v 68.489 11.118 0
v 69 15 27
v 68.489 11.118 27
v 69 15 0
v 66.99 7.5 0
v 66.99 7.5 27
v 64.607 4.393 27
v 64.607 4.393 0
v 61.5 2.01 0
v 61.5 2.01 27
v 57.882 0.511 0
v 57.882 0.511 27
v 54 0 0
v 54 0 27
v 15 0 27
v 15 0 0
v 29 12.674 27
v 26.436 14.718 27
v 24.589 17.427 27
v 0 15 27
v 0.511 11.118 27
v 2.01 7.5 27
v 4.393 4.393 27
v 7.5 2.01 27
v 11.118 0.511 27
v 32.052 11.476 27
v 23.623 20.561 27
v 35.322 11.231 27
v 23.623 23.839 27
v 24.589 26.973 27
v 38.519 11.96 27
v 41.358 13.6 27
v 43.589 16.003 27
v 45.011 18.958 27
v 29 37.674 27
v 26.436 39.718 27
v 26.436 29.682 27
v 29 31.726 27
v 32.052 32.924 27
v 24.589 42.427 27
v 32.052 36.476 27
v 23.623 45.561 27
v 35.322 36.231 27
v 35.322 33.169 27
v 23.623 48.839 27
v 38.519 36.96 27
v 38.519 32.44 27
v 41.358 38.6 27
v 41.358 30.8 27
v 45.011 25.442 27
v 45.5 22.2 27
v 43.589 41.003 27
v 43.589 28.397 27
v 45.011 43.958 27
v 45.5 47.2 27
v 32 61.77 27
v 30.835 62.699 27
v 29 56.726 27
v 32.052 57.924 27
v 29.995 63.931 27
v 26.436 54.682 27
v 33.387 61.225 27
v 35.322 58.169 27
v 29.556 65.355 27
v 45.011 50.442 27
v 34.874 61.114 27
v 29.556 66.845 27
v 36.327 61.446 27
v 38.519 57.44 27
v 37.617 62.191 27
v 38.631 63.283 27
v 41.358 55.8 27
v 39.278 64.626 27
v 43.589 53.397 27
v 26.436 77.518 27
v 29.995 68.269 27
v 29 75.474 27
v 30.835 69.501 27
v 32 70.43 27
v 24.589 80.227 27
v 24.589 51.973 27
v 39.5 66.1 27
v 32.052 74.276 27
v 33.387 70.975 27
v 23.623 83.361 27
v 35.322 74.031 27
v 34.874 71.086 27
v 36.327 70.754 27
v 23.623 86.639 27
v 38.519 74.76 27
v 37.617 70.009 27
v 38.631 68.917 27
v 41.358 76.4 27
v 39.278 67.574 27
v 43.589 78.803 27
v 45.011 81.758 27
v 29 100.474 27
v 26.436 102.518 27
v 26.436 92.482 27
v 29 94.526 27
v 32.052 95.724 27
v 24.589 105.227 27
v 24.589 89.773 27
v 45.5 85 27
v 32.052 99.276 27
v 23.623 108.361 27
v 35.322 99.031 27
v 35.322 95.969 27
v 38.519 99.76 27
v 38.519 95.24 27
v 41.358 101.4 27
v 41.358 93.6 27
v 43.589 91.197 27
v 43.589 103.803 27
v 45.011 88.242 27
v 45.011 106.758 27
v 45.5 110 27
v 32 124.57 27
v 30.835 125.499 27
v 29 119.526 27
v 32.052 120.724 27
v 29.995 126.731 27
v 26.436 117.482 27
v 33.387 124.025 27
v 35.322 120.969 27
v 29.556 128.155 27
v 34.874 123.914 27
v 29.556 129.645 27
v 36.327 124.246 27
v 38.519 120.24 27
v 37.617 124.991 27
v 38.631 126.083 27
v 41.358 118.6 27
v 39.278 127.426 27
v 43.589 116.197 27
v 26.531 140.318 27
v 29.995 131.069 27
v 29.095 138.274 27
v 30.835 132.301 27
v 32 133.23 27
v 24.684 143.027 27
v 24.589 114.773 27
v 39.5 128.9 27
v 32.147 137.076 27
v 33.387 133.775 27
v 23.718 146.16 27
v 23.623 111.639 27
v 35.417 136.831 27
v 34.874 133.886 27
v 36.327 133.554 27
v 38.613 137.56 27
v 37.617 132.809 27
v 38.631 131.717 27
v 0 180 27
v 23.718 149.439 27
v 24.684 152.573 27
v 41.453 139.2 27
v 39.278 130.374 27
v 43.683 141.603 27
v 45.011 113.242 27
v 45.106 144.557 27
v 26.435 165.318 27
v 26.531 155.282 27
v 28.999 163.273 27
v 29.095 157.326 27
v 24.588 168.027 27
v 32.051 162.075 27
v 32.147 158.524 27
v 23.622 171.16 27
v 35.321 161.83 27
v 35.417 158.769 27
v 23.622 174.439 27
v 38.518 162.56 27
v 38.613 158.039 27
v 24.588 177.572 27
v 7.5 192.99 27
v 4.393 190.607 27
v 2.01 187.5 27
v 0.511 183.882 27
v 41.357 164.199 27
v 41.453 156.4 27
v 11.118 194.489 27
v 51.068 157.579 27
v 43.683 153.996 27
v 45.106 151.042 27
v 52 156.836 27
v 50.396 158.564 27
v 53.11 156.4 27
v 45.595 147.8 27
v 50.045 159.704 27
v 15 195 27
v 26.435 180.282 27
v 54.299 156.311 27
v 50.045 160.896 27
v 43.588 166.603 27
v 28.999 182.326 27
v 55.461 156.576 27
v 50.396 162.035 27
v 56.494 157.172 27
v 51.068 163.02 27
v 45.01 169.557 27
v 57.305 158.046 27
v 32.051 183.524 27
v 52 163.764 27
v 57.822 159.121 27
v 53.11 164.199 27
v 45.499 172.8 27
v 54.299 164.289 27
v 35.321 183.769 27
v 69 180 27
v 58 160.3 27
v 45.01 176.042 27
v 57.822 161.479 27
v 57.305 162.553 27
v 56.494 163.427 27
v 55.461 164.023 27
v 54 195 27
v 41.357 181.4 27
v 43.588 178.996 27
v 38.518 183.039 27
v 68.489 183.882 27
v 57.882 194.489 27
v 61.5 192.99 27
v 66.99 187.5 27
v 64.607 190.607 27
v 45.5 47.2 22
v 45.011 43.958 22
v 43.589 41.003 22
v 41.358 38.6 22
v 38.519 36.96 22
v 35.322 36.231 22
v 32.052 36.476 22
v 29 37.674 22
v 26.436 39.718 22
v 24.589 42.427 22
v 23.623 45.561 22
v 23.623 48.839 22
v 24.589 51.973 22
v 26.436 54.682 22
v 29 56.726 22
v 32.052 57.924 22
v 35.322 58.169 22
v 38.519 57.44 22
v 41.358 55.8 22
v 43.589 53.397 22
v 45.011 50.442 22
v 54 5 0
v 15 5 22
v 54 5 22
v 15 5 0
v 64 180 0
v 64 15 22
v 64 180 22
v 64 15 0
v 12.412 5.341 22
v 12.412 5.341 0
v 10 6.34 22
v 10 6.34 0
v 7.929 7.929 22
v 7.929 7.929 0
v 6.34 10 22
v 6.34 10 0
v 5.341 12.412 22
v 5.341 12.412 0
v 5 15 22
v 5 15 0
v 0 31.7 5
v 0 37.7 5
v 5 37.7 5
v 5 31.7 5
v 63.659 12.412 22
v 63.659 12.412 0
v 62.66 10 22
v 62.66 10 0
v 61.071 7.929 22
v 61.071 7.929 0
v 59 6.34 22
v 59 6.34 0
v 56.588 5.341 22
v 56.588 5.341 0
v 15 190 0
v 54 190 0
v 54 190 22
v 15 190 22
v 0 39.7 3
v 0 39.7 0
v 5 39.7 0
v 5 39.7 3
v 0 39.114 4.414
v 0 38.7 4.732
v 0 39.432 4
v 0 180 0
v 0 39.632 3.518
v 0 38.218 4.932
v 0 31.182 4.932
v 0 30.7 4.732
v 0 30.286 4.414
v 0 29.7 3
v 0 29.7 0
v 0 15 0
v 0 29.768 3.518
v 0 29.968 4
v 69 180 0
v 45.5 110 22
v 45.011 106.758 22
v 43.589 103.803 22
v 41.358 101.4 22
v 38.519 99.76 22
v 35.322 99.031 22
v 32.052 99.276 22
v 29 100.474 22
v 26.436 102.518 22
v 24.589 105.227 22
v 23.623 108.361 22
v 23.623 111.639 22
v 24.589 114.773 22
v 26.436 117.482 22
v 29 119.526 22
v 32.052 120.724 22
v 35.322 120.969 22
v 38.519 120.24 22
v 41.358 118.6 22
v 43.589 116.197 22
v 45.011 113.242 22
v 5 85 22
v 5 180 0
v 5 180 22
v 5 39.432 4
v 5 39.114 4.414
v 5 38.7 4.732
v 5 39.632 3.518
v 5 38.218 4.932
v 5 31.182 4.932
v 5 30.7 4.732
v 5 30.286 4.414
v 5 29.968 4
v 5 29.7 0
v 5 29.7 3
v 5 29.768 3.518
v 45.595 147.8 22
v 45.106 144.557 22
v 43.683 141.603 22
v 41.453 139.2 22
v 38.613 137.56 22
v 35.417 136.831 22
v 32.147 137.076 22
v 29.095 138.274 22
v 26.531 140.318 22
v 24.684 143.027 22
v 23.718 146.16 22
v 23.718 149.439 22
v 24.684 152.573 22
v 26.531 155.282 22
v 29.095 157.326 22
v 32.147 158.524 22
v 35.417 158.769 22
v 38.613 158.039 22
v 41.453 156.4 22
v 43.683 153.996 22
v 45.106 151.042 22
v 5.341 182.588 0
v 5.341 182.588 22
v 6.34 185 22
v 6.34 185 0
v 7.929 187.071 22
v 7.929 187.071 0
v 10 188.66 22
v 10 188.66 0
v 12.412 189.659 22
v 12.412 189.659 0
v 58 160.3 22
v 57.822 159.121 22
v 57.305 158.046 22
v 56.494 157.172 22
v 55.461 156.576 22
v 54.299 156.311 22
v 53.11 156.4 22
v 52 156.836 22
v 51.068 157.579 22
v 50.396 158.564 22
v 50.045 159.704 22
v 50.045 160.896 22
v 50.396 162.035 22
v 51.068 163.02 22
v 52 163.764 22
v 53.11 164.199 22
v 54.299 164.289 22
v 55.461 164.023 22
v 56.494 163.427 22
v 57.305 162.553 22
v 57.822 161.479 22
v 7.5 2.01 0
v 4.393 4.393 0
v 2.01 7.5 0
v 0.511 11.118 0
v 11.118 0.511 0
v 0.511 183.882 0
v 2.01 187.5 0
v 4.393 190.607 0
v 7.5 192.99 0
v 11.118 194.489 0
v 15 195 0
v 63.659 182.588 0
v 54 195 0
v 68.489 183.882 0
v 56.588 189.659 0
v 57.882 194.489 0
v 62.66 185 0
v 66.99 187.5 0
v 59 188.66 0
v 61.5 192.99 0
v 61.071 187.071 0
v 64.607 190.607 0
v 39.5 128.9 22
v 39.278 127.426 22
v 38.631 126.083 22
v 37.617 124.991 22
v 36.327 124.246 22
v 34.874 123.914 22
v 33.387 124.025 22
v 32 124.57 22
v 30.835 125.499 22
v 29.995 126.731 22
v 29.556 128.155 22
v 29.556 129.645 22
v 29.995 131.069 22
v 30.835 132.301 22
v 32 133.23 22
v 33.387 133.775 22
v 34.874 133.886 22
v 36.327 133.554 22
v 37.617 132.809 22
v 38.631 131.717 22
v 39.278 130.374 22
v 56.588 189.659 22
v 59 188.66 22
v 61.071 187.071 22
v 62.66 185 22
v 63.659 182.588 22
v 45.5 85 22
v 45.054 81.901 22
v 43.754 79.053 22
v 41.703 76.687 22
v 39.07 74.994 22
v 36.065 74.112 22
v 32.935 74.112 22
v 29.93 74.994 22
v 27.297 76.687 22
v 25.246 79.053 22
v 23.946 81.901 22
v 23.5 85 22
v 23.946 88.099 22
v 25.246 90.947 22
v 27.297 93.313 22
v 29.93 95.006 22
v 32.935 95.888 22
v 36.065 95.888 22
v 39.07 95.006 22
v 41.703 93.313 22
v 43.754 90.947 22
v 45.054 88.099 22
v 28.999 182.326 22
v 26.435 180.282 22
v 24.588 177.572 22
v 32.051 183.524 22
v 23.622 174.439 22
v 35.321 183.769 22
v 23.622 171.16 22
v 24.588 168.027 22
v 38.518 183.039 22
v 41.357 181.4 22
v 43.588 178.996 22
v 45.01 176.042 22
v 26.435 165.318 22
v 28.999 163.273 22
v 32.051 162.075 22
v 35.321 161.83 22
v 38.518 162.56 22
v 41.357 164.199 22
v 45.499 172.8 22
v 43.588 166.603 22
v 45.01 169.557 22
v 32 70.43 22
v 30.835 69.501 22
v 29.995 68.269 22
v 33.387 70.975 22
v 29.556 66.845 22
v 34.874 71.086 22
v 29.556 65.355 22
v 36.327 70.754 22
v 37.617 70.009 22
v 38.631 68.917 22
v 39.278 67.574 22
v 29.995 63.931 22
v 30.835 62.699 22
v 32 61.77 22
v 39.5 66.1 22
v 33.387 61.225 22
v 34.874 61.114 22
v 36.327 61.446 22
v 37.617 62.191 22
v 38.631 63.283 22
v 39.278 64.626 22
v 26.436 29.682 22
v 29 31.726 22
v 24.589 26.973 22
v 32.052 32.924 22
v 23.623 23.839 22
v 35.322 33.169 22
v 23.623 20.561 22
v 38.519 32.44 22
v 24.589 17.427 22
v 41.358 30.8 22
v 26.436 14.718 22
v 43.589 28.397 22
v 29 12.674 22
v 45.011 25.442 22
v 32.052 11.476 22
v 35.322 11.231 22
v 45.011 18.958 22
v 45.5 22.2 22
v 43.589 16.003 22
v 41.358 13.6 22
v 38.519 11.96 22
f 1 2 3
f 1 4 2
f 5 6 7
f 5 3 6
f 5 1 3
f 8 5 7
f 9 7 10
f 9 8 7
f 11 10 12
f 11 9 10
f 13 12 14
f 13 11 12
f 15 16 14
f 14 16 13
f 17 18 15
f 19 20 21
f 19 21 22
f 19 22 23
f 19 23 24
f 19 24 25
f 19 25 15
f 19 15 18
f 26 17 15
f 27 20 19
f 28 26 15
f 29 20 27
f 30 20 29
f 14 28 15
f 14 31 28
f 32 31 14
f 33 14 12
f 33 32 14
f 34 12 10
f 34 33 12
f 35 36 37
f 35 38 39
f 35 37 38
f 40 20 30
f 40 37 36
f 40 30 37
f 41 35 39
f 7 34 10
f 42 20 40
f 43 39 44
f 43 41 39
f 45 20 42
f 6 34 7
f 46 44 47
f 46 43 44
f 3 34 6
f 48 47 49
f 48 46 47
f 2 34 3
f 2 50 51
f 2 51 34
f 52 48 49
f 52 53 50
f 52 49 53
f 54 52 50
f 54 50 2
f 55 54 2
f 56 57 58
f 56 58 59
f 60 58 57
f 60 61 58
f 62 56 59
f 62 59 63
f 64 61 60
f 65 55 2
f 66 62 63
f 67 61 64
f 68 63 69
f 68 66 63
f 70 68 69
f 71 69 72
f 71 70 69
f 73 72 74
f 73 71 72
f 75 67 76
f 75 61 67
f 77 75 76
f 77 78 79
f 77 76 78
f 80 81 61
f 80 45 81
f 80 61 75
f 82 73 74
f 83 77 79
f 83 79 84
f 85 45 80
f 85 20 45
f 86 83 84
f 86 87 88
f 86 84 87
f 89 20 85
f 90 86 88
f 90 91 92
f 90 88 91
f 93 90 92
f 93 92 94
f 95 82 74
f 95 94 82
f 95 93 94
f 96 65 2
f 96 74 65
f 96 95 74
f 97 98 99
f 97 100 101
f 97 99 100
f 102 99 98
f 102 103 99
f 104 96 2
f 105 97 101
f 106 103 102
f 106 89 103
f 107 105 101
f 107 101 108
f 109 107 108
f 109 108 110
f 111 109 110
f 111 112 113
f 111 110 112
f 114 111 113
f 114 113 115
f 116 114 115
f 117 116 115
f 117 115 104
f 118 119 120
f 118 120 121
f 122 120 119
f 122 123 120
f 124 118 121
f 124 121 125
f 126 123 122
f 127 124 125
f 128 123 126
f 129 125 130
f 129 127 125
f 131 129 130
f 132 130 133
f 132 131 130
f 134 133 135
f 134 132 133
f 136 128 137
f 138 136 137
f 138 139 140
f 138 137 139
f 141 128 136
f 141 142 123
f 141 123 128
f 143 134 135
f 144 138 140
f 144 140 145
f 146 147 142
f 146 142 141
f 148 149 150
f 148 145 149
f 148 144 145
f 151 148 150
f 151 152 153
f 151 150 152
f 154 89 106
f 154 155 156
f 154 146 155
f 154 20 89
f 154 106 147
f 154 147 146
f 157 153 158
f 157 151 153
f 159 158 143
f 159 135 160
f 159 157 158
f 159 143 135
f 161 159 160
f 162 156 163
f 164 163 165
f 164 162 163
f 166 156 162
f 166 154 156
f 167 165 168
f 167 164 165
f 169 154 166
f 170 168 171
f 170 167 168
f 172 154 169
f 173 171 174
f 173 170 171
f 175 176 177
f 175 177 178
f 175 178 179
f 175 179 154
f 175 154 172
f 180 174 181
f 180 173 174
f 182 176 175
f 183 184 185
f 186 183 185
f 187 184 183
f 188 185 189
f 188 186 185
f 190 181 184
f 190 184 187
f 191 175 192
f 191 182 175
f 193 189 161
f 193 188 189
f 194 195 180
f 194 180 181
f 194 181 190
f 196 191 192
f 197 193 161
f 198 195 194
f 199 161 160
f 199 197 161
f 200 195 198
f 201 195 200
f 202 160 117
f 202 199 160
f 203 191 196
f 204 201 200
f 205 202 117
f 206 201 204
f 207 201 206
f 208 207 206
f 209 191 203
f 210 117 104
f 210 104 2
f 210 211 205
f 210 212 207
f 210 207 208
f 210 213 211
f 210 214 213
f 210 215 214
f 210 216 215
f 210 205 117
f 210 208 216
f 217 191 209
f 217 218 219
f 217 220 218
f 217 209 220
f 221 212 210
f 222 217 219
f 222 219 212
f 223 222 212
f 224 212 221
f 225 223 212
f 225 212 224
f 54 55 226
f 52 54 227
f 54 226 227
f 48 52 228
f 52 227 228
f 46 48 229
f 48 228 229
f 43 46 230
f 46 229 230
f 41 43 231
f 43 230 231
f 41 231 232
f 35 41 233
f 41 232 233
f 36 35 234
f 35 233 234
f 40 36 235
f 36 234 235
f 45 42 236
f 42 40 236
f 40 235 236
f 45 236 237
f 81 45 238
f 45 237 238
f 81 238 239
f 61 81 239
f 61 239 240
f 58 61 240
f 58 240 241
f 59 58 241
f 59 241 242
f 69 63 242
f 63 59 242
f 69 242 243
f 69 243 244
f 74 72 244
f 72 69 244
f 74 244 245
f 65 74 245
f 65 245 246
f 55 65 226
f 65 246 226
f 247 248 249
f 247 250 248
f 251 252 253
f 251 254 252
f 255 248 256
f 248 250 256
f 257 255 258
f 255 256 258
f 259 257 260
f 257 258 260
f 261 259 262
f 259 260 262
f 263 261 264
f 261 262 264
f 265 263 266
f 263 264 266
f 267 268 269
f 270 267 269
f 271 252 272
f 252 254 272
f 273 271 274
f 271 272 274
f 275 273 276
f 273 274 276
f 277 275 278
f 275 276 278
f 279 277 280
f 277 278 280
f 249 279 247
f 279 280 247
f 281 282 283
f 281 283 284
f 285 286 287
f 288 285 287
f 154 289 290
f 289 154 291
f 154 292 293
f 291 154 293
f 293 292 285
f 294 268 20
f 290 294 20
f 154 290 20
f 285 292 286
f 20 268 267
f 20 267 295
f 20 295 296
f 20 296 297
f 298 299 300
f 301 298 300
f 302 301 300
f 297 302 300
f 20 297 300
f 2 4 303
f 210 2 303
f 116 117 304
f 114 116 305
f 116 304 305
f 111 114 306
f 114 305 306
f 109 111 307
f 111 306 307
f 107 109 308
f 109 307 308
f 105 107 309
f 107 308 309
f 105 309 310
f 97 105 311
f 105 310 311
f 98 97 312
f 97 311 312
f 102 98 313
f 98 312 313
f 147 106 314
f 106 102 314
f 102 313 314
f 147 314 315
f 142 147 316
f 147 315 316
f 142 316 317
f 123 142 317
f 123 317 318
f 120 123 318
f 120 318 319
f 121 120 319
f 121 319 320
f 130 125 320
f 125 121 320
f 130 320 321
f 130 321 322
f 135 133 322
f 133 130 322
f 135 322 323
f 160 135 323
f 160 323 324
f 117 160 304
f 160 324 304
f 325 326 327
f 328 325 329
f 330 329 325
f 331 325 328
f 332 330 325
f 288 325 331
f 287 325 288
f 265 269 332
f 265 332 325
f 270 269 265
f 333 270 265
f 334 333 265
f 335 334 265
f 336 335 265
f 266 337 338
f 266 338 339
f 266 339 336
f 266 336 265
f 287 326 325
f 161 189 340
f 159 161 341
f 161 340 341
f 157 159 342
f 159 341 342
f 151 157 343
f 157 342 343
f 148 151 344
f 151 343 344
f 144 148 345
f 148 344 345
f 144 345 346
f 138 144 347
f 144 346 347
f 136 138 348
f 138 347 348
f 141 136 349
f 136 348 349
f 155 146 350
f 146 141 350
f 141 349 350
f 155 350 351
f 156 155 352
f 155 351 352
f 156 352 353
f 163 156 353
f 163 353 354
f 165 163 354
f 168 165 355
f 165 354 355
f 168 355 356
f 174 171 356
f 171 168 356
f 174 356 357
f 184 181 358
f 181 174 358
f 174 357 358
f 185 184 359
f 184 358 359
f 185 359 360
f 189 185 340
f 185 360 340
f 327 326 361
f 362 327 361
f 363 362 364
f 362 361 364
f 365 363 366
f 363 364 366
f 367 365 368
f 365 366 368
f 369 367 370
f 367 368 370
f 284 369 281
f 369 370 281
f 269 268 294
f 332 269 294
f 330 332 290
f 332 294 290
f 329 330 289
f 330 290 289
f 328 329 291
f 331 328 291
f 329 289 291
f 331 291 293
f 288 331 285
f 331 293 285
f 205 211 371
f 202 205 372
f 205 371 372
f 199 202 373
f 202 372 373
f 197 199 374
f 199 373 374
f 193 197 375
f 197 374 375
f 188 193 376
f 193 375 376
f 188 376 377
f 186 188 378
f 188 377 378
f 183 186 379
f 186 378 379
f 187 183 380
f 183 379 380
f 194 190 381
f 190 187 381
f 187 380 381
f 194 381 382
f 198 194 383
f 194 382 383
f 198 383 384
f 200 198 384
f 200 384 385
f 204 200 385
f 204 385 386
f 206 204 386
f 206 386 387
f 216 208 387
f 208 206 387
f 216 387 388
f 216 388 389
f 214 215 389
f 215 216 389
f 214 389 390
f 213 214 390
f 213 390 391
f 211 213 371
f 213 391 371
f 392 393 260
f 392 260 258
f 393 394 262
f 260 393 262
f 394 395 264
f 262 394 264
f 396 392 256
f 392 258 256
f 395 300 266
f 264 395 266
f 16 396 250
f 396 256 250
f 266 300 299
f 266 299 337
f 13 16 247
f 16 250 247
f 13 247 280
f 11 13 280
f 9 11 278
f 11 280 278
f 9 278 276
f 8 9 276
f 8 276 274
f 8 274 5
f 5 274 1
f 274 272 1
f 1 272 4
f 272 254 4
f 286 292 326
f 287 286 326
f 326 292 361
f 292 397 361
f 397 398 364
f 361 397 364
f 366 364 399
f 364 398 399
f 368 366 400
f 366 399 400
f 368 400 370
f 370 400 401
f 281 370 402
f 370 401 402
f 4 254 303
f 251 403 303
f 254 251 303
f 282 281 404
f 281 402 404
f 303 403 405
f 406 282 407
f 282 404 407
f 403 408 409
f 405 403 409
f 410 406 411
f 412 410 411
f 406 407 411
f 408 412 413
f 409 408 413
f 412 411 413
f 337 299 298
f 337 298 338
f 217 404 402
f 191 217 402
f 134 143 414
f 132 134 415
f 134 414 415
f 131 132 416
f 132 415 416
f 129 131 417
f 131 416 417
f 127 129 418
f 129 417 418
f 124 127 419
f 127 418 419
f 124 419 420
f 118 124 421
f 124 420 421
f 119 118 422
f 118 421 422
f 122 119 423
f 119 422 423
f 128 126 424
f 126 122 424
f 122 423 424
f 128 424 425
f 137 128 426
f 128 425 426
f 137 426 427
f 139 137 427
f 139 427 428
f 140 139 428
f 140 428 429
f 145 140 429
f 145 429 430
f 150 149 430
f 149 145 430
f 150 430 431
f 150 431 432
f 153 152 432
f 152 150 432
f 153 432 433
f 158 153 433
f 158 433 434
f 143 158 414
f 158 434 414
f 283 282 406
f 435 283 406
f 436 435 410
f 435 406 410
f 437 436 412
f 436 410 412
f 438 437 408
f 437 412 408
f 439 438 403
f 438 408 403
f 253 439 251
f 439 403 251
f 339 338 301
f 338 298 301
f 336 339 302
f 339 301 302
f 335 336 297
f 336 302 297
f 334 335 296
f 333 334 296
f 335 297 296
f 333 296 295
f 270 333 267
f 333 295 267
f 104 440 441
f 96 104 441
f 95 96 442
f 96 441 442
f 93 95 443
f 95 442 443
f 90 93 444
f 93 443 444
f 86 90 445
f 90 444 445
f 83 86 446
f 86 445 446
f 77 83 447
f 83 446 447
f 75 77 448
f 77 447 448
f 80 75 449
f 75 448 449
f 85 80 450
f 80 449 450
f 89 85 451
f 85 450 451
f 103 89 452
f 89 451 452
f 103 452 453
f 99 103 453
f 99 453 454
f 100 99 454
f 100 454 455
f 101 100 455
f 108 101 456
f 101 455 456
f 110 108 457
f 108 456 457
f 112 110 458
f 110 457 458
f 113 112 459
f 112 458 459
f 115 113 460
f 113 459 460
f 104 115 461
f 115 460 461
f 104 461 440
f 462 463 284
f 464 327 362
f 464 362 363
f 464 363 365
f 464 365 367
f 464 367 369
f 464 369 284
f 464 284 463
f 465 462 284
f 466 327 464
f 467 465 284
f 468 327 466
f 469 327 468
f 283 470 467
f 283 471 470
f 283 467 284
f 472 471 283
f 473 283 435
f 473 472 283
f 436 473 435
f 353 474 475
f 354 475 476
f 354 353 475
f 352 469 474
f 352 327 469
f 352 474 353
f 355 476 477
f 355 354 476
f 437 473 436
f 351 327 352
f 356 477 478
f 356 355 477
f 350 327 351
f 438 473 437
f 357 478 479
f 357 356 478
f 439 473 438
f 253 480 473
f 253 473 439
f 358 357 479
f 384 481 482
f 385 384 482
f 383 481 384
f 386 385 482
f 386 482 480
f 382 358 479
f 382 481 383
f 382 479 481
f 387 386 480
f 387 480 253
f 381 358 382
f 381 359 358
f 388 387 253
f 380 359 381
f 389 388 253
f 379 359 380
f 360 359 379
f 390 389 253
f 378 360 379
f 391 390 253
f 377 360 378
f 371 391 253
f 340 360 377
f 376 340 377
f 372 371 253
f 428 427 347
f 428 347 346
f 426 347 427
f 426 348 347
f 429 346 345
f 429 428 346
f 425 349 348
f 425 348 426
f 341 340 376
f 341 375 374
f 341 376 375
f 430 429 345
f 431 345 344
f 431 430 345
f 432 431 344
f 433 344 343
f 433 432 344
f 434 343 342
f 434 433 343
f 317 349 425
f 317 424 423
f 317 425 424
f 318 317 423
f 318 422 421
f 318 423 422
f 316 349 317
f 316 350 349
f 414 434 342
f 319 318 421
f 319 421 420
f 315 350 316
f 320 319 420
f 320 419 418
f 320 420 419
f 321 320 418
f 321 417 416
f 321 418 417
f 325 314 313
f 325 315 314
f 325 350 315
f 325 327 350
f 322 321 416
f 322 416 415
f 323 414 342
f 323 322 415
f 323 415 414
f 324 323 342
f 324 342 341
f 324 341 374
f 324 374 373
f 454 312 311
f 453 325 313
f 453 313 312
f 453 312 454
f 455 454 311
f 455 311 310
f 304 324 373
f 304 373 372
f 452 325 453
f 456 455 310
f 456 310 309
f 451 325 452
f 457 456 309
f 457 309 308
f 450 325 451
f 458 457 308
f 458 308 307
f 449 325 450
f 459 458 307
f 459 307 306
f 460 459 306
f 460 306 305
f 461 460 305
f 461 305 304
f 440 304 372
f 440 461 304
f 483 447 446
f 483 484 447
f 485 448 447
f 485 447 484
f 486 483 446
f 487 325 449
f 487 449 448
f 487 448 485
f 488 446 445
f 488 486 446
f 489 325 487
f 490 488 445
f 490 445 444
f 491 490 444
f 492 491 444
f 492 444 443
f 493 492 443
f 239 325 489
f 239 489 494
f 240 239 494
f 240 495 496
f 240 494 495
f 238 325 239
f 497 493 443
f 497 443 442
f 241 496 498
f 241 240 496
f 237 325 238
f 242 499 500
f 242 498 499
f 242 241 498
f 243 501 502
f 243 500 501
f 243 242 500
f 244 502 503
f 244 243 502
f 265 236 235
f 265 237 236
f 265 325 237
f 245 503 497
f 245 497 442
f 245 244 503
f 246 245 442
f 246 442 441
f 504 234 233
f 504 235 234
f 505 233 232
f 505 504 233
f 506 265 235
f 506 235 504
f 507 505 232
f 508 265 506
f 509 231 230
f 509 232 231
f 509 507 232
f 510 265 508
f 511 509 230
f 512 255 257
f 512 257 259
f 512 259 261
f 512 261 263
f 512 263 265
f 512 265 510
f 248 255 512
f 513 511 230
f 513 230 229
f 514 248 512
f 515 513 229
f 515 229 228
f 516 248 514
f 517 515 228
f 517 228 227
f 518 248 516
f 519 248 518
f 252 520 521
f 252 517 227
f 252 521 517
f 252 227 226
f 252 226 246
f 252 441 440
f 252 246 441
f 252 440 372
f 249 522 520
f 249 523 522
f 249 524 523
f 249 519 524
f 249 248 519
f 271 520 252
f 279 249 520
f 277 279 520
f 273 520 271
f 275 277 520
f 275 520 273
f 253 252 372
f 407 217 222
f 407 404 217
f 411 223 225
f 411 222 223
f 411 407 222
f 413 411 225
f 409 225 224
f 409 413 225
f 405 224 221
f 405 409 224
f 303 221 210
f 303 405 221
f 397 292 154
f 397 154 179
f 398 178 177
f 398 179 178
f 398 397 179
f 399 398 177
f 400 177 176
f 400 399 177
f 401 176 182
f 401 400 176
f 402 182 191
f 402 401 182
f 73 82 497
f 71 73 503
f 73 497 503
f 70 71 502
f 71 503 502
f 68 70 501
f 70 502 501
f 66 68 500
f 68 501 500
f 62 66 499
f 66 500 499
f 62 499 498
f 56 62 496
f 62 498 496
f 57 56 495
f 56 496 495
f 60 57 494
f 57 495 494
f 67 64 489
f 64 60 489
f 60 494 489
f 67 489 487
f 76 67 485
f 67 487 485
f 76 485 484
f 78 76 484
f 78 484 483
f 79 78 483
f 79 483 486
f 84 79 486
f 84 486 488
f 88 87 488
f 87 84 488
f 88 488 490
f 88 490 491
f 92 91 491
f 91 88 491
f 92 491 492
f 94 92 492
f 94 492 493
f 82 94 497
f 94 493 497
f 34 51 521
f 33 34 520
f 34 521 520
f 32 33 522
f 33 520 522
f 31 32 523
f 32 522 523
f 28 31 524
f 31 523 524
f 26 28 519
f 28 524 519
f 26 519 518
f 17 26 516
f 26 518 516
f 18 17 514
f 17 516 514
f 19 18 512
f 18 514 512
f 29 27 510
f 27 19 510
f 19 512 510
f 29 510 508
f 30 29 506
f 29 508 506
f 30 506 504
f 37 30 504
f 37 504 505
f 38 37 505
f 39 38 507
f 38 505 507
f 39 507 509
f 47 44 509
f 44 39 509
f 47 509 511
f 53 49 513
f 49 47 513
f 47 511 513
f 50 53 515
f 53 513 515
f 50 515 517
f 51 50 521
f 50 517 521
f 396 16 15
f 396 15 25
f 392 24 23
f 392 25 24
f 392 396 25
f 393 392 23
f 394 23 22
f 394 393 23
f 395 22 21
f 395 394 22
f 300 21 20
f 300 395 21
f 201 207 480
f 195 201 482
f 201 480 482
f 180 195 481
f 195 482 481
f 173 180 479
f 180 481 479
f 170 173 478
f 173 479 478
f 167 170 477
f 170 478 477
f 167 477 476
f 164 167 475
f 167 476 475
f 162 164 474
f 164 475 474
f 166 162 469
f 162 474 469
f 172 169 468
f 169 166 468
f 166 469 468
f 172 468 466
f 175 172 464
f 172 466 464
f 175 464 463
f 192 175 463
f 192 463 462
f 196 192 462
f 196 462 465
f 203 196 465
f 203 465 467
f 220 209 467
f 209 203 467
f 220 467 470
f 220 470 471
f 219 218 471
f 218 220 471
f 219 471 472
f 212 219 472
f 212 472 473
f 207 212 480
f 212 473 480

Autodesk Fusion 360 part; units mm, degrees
sketch "Sketch1" plane through (0, 0, 0) normal (0, 0, 1) x (1, 0, 0)
  line L0 (10, 0) -> (59, 0)
  line L1 (69, 10) -> (69, 170)
  line L2 (59, 180) -> (10, 180)
  line L3 (0, 170) -> (0, 10)
  arc A0 (10, 180) -> (0, 170) centre (10, 170) ccw
  arc A1 (69, 170) -> (59, 180) centre (59, 170) ccw
  arc A2 (59, 0) -> (69, 10) centre (59, 10) ccw
  arc A3 (0, 10) -> (10, 0) centre (10, 10) ccw
  point P0 (69, 0)
  point P1 (0, 180)
  dimension "d1" = 69
  dimension "d2" = 180
  dimension "d3" = 10
  dimension "d4" = 10
  dimension "d5" = 10
sketch "Sketch2" plane through (0, 0, 27) normal (0, 0, 1) x (-1, 0, 0)
  line L0 (-10, 0) -> (-59, 0)
  arc A0 (-59, 0) -> (-69, -10) centre (-59, -10) ccw
sketch "Sketch3" plane through (0, 0, 0) normal (0, 0, 1) x (1, 0, 0)
  line L0 (15, 0) -> (54, 0)
  line L1 (69, 15) -> (69, 180)
  line L2 (54, 195) -> (15, 195)
  line L3 (0, 180) -> (0, 15)
  circle A0 centre (34.5, 110) radius 11
  circle A1 centre (34.5, 85) radius 11
  circle A2 centre (34.5, 128.9) radius 5
  circle A3 centre (34.5, 66.1) radius 5
  circle A4 centre (34.5, 47.2) radius 11
  circle A5 centre (34.5947, 147.7998) radius 11
  circle A6 centre (34.5, 22.2) radius 11
  circle A7 centre (34.4989, 172.7996) radius 11
  arc A8 (15, 195) -> (0, 180) centre (15, 180) ccw
  arc A9 (69, 180) -> (54, 195) centre (54, 180) ccw
  arc A10 (54, 0) -> (69, 15) centre (54, 15) ccw
  arc A11 (0, 15) -> (15, 0) centre (15, 15) ccw
  circle A12 centre (54, 160.2997) radius 4
  point P0 (69, 0)
  dimension "d76" = 22
  dimension "d77" = 22
  dimension "d78" = 18.9
  dimension "d79" = 18.9
  dimension "d80" = 10
  dimension "d81" = 10
  dimension "d82" = 18.9
  dimension "d83" = 18.9
  dimension "d84" = 22
  dimension "d85" = 22
  dimension "d86" = 25
  dimension "d87" = 25
  dimension "d88" = 22
  dimension "d89" = 22
  dimension "d90" = 15
  dimension "d91" = 15
  dimension "d92" = 15
  dimension "d93" = 15
  dimension "d130" = 8
sketch "Sketch4" plane through (0, 0, 27) normal (0, 0, 1) x (-1, 0, 0)
sketch "Sketch5" plane through (0, 0, 0) normal (0, 0, 1) x (1, 0, 0)
extrude "Extrude2" add sketch "Sketch3" along normal blind 27
sketch "Sketch6" plane through (0, 0, 0) normal (0, 0, -1) x (1, 0, 0)
  circle A0 centre (54, -160.2997) radius 4
  circle A1 centre (34.4989, -172.7996) radius 11
  circle A2 centre (34.5, -110) radius 11
  circle A3 centre (34.5947, -147.7998) radius 11
  circle A4 centre (34.5, -85) radius 11
  circle A5 centre (34.5, -66.1) radius 5
  circle A6 centre (34.5, -47.2) radius 11
  circle A7 centre (34.5, -22.2) radius 11
  circle A8 centre (34.5, -128.9) radius 5
  arc A9 (15, 0) -> (0, -15) centre (15, -15) ccw
  line L0 (0, -15) -> (0, -180)
  arc A10 (0, -180) -> (15, -195) centre (15, -180) ccw
  line L1 (15, -195) -> (54, -195)
  arc A11 (54, -195) -> (69, -180) centre (54, -180) ccw
  line L2 (69, -180) -> (69, -15)
  arc A12 (69, -15) -> (54, 0) centre (54, -15) ccw
  line L3 (54, 0) -> (15, 0)
  line L4 (34.5, -85) -> (0, -85)
  line L5 (15, -5) -> (54, -5)
  line L6 (64, -15) -> (64, -180)
  line L7 (54, -190) -> (15, -190)
  line L8 (5, -180) -> (5, -15)
  arc A13 (15, -5) -> (5, -15) centre (15, -15) ccw
  arc A14 (64, -15) -> (54, -5) centre (54, -15) ccw
  arc A15 (5, -180) -> (15, -190) centre (15, -180) ccw
  arc A16 (54, -190) -> (64, -180) centre (54, -180) ccw
  dimension "d162" = 10
  dimension "d163" = 10
  dimension "d164" = 10
  dimension "d165" = 10
extrude "Extrude3" cut sketch "Sketch6" against normal blind 22 contours L5 L6 L7 L8 A13 A14 A15 A16
sketch "Sketch7" plane through (0, 0, 27) normal (0, 0, 1) x (-1, 0, 0)
  circle A0 centre (-54, -160.2997) radius 4
  circle A1 centre (-34.4989, -172.7996) radius 11
  circle A2 centre (-34.5, -110) radius 11
  circle A3 centre (-34.5947, -147.7998) radius 11
  circle A4 centre (-34.5, -85) radius 11
  circle A5 centre (-34.5, -66.1) radius 5
  circle A6 centre (-34.5, -47.2) radius 11
  circle A7 centre (-34.5, -22.2) radius 11
  circle A8 centre (-34.5, -128.9) radius 5
  arc A9 (0, -15) -> (-15, 0) centre (-15, -15) ccw
  line L0 (-15, 0) -> (-54, 0)
  arc A10 (-54, 0) -> (-69, -15) centre (-54, -15) ccw
  line L1 (-69, -15) -> (-69, -180)
  arc A11 (-69, -180) -> (-54, -195) centre (-54, -180) ccw
  line L2 (-54, -195) -> (-15, -195)
  arc A12 (-15, -195) -> (0, -180) centre (-15, -180) ccw
  line L3 (0, -180) -> (0, -15)
sketch "Sketch8" plane through (0, 0, 0) normal (0, 0, -1) x (1, 0, 0)
  line L0 (54, -190) -> (15, -190)
  arc A0 (5, -180) -> (15, -190) centre (15, -180) ccw
  line L1 (5, -180) -> (5, -15)
  arc A1 (15, -5) -> (5, -15) centre (15, -15) ccw
  line L2 (15, -5) -> (54, -5)
  arc A2 (64, -15) -> (54, -5) centre (54, -15) ccw
  line L3 (64, -15) -> (64, -180)
  arc A3 (54, -190) -> (64, -180) centre (54, -180) ccw
  arc A4 (15, 0) -> (0, -15) centre (15, -15) ccw
  line L4 (0, -15) -> (0, -180)
  arc A5 (0, -180) -> (15, -195) centre (15, -180) ccw
  line L5 (15, -195) -> (54, -195)
  arc A6 (54, -195) -> (69, -180) centre (54, -180) ccw
  line L6 (69, -180) -> (69, -15)
  arc A7 (69, -15) -> (54, 0) centre (54, -15) ccw
  line L7 (54, 0) -> (15, 0)
  line L8 (0, -34.7) -> (0, -29.7)
  line L9 (0, -34.7) -> (0, -39.7)
  line L10 (0, -39.7) -> (0, -29.7)
  line L11 (0, -29.7) -> (5, -29.7)
  line L12 (0, -39.7) -> (5, -39.7)
  line L13 (5, -29.7) -> (5, -39.7)
extrude "Extrude4" cut sketch "Sketch8" against normal blind 5 contours L1 L4 L8 L9 L10 L11 L12 L13
sketch "Sketch9" plane through (0, 0, 0) normal (-1, 0, 0) x (0, -1, 0)
  line L0 (-39.7, 0) -> (-39.7, 5)
  line L1 (-39.7, 5) -> (-29.7, 5)
  line L2 (-29.7, 5) -> (-29.7, 0)
  line L3 (-29.7, 0) -> (-15, 0)
  line L4 (-15, 0) -> (-15, 27)
  line L5 (-15, 27) -> (-180, 27)
  line L6 (-180, 27) -> (-180, 0)
  line L7 (-180, 0) -> (-39.7, 0)
  line L8 (-29.7, 0) -> (-29.7, 3)
  line L9 (-31.7, 5) -> (-37.7, 5)
  line L10 (-39.7, 3) -> (-39.7, 0)
  arc A0 (-29.7, 3) -> (-31.7, 5) centre (-31.7, 3) ccw
  arc A1 (-37.7, 5) -> (-39.7, 3) centre (-37.7, 3) ccw
  dimension "d176" = 2
  dimension "d177" = 2
extrude "Extrude5" add sketch "Sketch9" against normal blind 5 contours L0 L1 A1 | L1 L2 A0
sketch "Sketch10" plane through (0, 0, 0) normal (-1, 0, 0) x (0, -1, 0)
  line L0 (-39.7, 0) -> (-39.7, 3)
  arc A0 (-37.7, 5) -> (-39.7, 3) centre (-37.7, 3) ccw
  line L1 (-37.7, 5) -> (-31.7, 5)
  arc A1 (-29.7, 3) -> (-31.7, 5) centre (-31.7, 3) ccw
  line L2 (-29.7, 3) -> (-29.7, 0)
  line L3 (-29.7, 0) -> (-15, 0)
  line L4 (-15, 0) -> (-15, 27)
  line L5 (-15, 27) -> (-180, 27)
  line L6 (-180, 27) -> (-180, 0)
  line L7 (-180, 0) -> (-39.7, 0)
